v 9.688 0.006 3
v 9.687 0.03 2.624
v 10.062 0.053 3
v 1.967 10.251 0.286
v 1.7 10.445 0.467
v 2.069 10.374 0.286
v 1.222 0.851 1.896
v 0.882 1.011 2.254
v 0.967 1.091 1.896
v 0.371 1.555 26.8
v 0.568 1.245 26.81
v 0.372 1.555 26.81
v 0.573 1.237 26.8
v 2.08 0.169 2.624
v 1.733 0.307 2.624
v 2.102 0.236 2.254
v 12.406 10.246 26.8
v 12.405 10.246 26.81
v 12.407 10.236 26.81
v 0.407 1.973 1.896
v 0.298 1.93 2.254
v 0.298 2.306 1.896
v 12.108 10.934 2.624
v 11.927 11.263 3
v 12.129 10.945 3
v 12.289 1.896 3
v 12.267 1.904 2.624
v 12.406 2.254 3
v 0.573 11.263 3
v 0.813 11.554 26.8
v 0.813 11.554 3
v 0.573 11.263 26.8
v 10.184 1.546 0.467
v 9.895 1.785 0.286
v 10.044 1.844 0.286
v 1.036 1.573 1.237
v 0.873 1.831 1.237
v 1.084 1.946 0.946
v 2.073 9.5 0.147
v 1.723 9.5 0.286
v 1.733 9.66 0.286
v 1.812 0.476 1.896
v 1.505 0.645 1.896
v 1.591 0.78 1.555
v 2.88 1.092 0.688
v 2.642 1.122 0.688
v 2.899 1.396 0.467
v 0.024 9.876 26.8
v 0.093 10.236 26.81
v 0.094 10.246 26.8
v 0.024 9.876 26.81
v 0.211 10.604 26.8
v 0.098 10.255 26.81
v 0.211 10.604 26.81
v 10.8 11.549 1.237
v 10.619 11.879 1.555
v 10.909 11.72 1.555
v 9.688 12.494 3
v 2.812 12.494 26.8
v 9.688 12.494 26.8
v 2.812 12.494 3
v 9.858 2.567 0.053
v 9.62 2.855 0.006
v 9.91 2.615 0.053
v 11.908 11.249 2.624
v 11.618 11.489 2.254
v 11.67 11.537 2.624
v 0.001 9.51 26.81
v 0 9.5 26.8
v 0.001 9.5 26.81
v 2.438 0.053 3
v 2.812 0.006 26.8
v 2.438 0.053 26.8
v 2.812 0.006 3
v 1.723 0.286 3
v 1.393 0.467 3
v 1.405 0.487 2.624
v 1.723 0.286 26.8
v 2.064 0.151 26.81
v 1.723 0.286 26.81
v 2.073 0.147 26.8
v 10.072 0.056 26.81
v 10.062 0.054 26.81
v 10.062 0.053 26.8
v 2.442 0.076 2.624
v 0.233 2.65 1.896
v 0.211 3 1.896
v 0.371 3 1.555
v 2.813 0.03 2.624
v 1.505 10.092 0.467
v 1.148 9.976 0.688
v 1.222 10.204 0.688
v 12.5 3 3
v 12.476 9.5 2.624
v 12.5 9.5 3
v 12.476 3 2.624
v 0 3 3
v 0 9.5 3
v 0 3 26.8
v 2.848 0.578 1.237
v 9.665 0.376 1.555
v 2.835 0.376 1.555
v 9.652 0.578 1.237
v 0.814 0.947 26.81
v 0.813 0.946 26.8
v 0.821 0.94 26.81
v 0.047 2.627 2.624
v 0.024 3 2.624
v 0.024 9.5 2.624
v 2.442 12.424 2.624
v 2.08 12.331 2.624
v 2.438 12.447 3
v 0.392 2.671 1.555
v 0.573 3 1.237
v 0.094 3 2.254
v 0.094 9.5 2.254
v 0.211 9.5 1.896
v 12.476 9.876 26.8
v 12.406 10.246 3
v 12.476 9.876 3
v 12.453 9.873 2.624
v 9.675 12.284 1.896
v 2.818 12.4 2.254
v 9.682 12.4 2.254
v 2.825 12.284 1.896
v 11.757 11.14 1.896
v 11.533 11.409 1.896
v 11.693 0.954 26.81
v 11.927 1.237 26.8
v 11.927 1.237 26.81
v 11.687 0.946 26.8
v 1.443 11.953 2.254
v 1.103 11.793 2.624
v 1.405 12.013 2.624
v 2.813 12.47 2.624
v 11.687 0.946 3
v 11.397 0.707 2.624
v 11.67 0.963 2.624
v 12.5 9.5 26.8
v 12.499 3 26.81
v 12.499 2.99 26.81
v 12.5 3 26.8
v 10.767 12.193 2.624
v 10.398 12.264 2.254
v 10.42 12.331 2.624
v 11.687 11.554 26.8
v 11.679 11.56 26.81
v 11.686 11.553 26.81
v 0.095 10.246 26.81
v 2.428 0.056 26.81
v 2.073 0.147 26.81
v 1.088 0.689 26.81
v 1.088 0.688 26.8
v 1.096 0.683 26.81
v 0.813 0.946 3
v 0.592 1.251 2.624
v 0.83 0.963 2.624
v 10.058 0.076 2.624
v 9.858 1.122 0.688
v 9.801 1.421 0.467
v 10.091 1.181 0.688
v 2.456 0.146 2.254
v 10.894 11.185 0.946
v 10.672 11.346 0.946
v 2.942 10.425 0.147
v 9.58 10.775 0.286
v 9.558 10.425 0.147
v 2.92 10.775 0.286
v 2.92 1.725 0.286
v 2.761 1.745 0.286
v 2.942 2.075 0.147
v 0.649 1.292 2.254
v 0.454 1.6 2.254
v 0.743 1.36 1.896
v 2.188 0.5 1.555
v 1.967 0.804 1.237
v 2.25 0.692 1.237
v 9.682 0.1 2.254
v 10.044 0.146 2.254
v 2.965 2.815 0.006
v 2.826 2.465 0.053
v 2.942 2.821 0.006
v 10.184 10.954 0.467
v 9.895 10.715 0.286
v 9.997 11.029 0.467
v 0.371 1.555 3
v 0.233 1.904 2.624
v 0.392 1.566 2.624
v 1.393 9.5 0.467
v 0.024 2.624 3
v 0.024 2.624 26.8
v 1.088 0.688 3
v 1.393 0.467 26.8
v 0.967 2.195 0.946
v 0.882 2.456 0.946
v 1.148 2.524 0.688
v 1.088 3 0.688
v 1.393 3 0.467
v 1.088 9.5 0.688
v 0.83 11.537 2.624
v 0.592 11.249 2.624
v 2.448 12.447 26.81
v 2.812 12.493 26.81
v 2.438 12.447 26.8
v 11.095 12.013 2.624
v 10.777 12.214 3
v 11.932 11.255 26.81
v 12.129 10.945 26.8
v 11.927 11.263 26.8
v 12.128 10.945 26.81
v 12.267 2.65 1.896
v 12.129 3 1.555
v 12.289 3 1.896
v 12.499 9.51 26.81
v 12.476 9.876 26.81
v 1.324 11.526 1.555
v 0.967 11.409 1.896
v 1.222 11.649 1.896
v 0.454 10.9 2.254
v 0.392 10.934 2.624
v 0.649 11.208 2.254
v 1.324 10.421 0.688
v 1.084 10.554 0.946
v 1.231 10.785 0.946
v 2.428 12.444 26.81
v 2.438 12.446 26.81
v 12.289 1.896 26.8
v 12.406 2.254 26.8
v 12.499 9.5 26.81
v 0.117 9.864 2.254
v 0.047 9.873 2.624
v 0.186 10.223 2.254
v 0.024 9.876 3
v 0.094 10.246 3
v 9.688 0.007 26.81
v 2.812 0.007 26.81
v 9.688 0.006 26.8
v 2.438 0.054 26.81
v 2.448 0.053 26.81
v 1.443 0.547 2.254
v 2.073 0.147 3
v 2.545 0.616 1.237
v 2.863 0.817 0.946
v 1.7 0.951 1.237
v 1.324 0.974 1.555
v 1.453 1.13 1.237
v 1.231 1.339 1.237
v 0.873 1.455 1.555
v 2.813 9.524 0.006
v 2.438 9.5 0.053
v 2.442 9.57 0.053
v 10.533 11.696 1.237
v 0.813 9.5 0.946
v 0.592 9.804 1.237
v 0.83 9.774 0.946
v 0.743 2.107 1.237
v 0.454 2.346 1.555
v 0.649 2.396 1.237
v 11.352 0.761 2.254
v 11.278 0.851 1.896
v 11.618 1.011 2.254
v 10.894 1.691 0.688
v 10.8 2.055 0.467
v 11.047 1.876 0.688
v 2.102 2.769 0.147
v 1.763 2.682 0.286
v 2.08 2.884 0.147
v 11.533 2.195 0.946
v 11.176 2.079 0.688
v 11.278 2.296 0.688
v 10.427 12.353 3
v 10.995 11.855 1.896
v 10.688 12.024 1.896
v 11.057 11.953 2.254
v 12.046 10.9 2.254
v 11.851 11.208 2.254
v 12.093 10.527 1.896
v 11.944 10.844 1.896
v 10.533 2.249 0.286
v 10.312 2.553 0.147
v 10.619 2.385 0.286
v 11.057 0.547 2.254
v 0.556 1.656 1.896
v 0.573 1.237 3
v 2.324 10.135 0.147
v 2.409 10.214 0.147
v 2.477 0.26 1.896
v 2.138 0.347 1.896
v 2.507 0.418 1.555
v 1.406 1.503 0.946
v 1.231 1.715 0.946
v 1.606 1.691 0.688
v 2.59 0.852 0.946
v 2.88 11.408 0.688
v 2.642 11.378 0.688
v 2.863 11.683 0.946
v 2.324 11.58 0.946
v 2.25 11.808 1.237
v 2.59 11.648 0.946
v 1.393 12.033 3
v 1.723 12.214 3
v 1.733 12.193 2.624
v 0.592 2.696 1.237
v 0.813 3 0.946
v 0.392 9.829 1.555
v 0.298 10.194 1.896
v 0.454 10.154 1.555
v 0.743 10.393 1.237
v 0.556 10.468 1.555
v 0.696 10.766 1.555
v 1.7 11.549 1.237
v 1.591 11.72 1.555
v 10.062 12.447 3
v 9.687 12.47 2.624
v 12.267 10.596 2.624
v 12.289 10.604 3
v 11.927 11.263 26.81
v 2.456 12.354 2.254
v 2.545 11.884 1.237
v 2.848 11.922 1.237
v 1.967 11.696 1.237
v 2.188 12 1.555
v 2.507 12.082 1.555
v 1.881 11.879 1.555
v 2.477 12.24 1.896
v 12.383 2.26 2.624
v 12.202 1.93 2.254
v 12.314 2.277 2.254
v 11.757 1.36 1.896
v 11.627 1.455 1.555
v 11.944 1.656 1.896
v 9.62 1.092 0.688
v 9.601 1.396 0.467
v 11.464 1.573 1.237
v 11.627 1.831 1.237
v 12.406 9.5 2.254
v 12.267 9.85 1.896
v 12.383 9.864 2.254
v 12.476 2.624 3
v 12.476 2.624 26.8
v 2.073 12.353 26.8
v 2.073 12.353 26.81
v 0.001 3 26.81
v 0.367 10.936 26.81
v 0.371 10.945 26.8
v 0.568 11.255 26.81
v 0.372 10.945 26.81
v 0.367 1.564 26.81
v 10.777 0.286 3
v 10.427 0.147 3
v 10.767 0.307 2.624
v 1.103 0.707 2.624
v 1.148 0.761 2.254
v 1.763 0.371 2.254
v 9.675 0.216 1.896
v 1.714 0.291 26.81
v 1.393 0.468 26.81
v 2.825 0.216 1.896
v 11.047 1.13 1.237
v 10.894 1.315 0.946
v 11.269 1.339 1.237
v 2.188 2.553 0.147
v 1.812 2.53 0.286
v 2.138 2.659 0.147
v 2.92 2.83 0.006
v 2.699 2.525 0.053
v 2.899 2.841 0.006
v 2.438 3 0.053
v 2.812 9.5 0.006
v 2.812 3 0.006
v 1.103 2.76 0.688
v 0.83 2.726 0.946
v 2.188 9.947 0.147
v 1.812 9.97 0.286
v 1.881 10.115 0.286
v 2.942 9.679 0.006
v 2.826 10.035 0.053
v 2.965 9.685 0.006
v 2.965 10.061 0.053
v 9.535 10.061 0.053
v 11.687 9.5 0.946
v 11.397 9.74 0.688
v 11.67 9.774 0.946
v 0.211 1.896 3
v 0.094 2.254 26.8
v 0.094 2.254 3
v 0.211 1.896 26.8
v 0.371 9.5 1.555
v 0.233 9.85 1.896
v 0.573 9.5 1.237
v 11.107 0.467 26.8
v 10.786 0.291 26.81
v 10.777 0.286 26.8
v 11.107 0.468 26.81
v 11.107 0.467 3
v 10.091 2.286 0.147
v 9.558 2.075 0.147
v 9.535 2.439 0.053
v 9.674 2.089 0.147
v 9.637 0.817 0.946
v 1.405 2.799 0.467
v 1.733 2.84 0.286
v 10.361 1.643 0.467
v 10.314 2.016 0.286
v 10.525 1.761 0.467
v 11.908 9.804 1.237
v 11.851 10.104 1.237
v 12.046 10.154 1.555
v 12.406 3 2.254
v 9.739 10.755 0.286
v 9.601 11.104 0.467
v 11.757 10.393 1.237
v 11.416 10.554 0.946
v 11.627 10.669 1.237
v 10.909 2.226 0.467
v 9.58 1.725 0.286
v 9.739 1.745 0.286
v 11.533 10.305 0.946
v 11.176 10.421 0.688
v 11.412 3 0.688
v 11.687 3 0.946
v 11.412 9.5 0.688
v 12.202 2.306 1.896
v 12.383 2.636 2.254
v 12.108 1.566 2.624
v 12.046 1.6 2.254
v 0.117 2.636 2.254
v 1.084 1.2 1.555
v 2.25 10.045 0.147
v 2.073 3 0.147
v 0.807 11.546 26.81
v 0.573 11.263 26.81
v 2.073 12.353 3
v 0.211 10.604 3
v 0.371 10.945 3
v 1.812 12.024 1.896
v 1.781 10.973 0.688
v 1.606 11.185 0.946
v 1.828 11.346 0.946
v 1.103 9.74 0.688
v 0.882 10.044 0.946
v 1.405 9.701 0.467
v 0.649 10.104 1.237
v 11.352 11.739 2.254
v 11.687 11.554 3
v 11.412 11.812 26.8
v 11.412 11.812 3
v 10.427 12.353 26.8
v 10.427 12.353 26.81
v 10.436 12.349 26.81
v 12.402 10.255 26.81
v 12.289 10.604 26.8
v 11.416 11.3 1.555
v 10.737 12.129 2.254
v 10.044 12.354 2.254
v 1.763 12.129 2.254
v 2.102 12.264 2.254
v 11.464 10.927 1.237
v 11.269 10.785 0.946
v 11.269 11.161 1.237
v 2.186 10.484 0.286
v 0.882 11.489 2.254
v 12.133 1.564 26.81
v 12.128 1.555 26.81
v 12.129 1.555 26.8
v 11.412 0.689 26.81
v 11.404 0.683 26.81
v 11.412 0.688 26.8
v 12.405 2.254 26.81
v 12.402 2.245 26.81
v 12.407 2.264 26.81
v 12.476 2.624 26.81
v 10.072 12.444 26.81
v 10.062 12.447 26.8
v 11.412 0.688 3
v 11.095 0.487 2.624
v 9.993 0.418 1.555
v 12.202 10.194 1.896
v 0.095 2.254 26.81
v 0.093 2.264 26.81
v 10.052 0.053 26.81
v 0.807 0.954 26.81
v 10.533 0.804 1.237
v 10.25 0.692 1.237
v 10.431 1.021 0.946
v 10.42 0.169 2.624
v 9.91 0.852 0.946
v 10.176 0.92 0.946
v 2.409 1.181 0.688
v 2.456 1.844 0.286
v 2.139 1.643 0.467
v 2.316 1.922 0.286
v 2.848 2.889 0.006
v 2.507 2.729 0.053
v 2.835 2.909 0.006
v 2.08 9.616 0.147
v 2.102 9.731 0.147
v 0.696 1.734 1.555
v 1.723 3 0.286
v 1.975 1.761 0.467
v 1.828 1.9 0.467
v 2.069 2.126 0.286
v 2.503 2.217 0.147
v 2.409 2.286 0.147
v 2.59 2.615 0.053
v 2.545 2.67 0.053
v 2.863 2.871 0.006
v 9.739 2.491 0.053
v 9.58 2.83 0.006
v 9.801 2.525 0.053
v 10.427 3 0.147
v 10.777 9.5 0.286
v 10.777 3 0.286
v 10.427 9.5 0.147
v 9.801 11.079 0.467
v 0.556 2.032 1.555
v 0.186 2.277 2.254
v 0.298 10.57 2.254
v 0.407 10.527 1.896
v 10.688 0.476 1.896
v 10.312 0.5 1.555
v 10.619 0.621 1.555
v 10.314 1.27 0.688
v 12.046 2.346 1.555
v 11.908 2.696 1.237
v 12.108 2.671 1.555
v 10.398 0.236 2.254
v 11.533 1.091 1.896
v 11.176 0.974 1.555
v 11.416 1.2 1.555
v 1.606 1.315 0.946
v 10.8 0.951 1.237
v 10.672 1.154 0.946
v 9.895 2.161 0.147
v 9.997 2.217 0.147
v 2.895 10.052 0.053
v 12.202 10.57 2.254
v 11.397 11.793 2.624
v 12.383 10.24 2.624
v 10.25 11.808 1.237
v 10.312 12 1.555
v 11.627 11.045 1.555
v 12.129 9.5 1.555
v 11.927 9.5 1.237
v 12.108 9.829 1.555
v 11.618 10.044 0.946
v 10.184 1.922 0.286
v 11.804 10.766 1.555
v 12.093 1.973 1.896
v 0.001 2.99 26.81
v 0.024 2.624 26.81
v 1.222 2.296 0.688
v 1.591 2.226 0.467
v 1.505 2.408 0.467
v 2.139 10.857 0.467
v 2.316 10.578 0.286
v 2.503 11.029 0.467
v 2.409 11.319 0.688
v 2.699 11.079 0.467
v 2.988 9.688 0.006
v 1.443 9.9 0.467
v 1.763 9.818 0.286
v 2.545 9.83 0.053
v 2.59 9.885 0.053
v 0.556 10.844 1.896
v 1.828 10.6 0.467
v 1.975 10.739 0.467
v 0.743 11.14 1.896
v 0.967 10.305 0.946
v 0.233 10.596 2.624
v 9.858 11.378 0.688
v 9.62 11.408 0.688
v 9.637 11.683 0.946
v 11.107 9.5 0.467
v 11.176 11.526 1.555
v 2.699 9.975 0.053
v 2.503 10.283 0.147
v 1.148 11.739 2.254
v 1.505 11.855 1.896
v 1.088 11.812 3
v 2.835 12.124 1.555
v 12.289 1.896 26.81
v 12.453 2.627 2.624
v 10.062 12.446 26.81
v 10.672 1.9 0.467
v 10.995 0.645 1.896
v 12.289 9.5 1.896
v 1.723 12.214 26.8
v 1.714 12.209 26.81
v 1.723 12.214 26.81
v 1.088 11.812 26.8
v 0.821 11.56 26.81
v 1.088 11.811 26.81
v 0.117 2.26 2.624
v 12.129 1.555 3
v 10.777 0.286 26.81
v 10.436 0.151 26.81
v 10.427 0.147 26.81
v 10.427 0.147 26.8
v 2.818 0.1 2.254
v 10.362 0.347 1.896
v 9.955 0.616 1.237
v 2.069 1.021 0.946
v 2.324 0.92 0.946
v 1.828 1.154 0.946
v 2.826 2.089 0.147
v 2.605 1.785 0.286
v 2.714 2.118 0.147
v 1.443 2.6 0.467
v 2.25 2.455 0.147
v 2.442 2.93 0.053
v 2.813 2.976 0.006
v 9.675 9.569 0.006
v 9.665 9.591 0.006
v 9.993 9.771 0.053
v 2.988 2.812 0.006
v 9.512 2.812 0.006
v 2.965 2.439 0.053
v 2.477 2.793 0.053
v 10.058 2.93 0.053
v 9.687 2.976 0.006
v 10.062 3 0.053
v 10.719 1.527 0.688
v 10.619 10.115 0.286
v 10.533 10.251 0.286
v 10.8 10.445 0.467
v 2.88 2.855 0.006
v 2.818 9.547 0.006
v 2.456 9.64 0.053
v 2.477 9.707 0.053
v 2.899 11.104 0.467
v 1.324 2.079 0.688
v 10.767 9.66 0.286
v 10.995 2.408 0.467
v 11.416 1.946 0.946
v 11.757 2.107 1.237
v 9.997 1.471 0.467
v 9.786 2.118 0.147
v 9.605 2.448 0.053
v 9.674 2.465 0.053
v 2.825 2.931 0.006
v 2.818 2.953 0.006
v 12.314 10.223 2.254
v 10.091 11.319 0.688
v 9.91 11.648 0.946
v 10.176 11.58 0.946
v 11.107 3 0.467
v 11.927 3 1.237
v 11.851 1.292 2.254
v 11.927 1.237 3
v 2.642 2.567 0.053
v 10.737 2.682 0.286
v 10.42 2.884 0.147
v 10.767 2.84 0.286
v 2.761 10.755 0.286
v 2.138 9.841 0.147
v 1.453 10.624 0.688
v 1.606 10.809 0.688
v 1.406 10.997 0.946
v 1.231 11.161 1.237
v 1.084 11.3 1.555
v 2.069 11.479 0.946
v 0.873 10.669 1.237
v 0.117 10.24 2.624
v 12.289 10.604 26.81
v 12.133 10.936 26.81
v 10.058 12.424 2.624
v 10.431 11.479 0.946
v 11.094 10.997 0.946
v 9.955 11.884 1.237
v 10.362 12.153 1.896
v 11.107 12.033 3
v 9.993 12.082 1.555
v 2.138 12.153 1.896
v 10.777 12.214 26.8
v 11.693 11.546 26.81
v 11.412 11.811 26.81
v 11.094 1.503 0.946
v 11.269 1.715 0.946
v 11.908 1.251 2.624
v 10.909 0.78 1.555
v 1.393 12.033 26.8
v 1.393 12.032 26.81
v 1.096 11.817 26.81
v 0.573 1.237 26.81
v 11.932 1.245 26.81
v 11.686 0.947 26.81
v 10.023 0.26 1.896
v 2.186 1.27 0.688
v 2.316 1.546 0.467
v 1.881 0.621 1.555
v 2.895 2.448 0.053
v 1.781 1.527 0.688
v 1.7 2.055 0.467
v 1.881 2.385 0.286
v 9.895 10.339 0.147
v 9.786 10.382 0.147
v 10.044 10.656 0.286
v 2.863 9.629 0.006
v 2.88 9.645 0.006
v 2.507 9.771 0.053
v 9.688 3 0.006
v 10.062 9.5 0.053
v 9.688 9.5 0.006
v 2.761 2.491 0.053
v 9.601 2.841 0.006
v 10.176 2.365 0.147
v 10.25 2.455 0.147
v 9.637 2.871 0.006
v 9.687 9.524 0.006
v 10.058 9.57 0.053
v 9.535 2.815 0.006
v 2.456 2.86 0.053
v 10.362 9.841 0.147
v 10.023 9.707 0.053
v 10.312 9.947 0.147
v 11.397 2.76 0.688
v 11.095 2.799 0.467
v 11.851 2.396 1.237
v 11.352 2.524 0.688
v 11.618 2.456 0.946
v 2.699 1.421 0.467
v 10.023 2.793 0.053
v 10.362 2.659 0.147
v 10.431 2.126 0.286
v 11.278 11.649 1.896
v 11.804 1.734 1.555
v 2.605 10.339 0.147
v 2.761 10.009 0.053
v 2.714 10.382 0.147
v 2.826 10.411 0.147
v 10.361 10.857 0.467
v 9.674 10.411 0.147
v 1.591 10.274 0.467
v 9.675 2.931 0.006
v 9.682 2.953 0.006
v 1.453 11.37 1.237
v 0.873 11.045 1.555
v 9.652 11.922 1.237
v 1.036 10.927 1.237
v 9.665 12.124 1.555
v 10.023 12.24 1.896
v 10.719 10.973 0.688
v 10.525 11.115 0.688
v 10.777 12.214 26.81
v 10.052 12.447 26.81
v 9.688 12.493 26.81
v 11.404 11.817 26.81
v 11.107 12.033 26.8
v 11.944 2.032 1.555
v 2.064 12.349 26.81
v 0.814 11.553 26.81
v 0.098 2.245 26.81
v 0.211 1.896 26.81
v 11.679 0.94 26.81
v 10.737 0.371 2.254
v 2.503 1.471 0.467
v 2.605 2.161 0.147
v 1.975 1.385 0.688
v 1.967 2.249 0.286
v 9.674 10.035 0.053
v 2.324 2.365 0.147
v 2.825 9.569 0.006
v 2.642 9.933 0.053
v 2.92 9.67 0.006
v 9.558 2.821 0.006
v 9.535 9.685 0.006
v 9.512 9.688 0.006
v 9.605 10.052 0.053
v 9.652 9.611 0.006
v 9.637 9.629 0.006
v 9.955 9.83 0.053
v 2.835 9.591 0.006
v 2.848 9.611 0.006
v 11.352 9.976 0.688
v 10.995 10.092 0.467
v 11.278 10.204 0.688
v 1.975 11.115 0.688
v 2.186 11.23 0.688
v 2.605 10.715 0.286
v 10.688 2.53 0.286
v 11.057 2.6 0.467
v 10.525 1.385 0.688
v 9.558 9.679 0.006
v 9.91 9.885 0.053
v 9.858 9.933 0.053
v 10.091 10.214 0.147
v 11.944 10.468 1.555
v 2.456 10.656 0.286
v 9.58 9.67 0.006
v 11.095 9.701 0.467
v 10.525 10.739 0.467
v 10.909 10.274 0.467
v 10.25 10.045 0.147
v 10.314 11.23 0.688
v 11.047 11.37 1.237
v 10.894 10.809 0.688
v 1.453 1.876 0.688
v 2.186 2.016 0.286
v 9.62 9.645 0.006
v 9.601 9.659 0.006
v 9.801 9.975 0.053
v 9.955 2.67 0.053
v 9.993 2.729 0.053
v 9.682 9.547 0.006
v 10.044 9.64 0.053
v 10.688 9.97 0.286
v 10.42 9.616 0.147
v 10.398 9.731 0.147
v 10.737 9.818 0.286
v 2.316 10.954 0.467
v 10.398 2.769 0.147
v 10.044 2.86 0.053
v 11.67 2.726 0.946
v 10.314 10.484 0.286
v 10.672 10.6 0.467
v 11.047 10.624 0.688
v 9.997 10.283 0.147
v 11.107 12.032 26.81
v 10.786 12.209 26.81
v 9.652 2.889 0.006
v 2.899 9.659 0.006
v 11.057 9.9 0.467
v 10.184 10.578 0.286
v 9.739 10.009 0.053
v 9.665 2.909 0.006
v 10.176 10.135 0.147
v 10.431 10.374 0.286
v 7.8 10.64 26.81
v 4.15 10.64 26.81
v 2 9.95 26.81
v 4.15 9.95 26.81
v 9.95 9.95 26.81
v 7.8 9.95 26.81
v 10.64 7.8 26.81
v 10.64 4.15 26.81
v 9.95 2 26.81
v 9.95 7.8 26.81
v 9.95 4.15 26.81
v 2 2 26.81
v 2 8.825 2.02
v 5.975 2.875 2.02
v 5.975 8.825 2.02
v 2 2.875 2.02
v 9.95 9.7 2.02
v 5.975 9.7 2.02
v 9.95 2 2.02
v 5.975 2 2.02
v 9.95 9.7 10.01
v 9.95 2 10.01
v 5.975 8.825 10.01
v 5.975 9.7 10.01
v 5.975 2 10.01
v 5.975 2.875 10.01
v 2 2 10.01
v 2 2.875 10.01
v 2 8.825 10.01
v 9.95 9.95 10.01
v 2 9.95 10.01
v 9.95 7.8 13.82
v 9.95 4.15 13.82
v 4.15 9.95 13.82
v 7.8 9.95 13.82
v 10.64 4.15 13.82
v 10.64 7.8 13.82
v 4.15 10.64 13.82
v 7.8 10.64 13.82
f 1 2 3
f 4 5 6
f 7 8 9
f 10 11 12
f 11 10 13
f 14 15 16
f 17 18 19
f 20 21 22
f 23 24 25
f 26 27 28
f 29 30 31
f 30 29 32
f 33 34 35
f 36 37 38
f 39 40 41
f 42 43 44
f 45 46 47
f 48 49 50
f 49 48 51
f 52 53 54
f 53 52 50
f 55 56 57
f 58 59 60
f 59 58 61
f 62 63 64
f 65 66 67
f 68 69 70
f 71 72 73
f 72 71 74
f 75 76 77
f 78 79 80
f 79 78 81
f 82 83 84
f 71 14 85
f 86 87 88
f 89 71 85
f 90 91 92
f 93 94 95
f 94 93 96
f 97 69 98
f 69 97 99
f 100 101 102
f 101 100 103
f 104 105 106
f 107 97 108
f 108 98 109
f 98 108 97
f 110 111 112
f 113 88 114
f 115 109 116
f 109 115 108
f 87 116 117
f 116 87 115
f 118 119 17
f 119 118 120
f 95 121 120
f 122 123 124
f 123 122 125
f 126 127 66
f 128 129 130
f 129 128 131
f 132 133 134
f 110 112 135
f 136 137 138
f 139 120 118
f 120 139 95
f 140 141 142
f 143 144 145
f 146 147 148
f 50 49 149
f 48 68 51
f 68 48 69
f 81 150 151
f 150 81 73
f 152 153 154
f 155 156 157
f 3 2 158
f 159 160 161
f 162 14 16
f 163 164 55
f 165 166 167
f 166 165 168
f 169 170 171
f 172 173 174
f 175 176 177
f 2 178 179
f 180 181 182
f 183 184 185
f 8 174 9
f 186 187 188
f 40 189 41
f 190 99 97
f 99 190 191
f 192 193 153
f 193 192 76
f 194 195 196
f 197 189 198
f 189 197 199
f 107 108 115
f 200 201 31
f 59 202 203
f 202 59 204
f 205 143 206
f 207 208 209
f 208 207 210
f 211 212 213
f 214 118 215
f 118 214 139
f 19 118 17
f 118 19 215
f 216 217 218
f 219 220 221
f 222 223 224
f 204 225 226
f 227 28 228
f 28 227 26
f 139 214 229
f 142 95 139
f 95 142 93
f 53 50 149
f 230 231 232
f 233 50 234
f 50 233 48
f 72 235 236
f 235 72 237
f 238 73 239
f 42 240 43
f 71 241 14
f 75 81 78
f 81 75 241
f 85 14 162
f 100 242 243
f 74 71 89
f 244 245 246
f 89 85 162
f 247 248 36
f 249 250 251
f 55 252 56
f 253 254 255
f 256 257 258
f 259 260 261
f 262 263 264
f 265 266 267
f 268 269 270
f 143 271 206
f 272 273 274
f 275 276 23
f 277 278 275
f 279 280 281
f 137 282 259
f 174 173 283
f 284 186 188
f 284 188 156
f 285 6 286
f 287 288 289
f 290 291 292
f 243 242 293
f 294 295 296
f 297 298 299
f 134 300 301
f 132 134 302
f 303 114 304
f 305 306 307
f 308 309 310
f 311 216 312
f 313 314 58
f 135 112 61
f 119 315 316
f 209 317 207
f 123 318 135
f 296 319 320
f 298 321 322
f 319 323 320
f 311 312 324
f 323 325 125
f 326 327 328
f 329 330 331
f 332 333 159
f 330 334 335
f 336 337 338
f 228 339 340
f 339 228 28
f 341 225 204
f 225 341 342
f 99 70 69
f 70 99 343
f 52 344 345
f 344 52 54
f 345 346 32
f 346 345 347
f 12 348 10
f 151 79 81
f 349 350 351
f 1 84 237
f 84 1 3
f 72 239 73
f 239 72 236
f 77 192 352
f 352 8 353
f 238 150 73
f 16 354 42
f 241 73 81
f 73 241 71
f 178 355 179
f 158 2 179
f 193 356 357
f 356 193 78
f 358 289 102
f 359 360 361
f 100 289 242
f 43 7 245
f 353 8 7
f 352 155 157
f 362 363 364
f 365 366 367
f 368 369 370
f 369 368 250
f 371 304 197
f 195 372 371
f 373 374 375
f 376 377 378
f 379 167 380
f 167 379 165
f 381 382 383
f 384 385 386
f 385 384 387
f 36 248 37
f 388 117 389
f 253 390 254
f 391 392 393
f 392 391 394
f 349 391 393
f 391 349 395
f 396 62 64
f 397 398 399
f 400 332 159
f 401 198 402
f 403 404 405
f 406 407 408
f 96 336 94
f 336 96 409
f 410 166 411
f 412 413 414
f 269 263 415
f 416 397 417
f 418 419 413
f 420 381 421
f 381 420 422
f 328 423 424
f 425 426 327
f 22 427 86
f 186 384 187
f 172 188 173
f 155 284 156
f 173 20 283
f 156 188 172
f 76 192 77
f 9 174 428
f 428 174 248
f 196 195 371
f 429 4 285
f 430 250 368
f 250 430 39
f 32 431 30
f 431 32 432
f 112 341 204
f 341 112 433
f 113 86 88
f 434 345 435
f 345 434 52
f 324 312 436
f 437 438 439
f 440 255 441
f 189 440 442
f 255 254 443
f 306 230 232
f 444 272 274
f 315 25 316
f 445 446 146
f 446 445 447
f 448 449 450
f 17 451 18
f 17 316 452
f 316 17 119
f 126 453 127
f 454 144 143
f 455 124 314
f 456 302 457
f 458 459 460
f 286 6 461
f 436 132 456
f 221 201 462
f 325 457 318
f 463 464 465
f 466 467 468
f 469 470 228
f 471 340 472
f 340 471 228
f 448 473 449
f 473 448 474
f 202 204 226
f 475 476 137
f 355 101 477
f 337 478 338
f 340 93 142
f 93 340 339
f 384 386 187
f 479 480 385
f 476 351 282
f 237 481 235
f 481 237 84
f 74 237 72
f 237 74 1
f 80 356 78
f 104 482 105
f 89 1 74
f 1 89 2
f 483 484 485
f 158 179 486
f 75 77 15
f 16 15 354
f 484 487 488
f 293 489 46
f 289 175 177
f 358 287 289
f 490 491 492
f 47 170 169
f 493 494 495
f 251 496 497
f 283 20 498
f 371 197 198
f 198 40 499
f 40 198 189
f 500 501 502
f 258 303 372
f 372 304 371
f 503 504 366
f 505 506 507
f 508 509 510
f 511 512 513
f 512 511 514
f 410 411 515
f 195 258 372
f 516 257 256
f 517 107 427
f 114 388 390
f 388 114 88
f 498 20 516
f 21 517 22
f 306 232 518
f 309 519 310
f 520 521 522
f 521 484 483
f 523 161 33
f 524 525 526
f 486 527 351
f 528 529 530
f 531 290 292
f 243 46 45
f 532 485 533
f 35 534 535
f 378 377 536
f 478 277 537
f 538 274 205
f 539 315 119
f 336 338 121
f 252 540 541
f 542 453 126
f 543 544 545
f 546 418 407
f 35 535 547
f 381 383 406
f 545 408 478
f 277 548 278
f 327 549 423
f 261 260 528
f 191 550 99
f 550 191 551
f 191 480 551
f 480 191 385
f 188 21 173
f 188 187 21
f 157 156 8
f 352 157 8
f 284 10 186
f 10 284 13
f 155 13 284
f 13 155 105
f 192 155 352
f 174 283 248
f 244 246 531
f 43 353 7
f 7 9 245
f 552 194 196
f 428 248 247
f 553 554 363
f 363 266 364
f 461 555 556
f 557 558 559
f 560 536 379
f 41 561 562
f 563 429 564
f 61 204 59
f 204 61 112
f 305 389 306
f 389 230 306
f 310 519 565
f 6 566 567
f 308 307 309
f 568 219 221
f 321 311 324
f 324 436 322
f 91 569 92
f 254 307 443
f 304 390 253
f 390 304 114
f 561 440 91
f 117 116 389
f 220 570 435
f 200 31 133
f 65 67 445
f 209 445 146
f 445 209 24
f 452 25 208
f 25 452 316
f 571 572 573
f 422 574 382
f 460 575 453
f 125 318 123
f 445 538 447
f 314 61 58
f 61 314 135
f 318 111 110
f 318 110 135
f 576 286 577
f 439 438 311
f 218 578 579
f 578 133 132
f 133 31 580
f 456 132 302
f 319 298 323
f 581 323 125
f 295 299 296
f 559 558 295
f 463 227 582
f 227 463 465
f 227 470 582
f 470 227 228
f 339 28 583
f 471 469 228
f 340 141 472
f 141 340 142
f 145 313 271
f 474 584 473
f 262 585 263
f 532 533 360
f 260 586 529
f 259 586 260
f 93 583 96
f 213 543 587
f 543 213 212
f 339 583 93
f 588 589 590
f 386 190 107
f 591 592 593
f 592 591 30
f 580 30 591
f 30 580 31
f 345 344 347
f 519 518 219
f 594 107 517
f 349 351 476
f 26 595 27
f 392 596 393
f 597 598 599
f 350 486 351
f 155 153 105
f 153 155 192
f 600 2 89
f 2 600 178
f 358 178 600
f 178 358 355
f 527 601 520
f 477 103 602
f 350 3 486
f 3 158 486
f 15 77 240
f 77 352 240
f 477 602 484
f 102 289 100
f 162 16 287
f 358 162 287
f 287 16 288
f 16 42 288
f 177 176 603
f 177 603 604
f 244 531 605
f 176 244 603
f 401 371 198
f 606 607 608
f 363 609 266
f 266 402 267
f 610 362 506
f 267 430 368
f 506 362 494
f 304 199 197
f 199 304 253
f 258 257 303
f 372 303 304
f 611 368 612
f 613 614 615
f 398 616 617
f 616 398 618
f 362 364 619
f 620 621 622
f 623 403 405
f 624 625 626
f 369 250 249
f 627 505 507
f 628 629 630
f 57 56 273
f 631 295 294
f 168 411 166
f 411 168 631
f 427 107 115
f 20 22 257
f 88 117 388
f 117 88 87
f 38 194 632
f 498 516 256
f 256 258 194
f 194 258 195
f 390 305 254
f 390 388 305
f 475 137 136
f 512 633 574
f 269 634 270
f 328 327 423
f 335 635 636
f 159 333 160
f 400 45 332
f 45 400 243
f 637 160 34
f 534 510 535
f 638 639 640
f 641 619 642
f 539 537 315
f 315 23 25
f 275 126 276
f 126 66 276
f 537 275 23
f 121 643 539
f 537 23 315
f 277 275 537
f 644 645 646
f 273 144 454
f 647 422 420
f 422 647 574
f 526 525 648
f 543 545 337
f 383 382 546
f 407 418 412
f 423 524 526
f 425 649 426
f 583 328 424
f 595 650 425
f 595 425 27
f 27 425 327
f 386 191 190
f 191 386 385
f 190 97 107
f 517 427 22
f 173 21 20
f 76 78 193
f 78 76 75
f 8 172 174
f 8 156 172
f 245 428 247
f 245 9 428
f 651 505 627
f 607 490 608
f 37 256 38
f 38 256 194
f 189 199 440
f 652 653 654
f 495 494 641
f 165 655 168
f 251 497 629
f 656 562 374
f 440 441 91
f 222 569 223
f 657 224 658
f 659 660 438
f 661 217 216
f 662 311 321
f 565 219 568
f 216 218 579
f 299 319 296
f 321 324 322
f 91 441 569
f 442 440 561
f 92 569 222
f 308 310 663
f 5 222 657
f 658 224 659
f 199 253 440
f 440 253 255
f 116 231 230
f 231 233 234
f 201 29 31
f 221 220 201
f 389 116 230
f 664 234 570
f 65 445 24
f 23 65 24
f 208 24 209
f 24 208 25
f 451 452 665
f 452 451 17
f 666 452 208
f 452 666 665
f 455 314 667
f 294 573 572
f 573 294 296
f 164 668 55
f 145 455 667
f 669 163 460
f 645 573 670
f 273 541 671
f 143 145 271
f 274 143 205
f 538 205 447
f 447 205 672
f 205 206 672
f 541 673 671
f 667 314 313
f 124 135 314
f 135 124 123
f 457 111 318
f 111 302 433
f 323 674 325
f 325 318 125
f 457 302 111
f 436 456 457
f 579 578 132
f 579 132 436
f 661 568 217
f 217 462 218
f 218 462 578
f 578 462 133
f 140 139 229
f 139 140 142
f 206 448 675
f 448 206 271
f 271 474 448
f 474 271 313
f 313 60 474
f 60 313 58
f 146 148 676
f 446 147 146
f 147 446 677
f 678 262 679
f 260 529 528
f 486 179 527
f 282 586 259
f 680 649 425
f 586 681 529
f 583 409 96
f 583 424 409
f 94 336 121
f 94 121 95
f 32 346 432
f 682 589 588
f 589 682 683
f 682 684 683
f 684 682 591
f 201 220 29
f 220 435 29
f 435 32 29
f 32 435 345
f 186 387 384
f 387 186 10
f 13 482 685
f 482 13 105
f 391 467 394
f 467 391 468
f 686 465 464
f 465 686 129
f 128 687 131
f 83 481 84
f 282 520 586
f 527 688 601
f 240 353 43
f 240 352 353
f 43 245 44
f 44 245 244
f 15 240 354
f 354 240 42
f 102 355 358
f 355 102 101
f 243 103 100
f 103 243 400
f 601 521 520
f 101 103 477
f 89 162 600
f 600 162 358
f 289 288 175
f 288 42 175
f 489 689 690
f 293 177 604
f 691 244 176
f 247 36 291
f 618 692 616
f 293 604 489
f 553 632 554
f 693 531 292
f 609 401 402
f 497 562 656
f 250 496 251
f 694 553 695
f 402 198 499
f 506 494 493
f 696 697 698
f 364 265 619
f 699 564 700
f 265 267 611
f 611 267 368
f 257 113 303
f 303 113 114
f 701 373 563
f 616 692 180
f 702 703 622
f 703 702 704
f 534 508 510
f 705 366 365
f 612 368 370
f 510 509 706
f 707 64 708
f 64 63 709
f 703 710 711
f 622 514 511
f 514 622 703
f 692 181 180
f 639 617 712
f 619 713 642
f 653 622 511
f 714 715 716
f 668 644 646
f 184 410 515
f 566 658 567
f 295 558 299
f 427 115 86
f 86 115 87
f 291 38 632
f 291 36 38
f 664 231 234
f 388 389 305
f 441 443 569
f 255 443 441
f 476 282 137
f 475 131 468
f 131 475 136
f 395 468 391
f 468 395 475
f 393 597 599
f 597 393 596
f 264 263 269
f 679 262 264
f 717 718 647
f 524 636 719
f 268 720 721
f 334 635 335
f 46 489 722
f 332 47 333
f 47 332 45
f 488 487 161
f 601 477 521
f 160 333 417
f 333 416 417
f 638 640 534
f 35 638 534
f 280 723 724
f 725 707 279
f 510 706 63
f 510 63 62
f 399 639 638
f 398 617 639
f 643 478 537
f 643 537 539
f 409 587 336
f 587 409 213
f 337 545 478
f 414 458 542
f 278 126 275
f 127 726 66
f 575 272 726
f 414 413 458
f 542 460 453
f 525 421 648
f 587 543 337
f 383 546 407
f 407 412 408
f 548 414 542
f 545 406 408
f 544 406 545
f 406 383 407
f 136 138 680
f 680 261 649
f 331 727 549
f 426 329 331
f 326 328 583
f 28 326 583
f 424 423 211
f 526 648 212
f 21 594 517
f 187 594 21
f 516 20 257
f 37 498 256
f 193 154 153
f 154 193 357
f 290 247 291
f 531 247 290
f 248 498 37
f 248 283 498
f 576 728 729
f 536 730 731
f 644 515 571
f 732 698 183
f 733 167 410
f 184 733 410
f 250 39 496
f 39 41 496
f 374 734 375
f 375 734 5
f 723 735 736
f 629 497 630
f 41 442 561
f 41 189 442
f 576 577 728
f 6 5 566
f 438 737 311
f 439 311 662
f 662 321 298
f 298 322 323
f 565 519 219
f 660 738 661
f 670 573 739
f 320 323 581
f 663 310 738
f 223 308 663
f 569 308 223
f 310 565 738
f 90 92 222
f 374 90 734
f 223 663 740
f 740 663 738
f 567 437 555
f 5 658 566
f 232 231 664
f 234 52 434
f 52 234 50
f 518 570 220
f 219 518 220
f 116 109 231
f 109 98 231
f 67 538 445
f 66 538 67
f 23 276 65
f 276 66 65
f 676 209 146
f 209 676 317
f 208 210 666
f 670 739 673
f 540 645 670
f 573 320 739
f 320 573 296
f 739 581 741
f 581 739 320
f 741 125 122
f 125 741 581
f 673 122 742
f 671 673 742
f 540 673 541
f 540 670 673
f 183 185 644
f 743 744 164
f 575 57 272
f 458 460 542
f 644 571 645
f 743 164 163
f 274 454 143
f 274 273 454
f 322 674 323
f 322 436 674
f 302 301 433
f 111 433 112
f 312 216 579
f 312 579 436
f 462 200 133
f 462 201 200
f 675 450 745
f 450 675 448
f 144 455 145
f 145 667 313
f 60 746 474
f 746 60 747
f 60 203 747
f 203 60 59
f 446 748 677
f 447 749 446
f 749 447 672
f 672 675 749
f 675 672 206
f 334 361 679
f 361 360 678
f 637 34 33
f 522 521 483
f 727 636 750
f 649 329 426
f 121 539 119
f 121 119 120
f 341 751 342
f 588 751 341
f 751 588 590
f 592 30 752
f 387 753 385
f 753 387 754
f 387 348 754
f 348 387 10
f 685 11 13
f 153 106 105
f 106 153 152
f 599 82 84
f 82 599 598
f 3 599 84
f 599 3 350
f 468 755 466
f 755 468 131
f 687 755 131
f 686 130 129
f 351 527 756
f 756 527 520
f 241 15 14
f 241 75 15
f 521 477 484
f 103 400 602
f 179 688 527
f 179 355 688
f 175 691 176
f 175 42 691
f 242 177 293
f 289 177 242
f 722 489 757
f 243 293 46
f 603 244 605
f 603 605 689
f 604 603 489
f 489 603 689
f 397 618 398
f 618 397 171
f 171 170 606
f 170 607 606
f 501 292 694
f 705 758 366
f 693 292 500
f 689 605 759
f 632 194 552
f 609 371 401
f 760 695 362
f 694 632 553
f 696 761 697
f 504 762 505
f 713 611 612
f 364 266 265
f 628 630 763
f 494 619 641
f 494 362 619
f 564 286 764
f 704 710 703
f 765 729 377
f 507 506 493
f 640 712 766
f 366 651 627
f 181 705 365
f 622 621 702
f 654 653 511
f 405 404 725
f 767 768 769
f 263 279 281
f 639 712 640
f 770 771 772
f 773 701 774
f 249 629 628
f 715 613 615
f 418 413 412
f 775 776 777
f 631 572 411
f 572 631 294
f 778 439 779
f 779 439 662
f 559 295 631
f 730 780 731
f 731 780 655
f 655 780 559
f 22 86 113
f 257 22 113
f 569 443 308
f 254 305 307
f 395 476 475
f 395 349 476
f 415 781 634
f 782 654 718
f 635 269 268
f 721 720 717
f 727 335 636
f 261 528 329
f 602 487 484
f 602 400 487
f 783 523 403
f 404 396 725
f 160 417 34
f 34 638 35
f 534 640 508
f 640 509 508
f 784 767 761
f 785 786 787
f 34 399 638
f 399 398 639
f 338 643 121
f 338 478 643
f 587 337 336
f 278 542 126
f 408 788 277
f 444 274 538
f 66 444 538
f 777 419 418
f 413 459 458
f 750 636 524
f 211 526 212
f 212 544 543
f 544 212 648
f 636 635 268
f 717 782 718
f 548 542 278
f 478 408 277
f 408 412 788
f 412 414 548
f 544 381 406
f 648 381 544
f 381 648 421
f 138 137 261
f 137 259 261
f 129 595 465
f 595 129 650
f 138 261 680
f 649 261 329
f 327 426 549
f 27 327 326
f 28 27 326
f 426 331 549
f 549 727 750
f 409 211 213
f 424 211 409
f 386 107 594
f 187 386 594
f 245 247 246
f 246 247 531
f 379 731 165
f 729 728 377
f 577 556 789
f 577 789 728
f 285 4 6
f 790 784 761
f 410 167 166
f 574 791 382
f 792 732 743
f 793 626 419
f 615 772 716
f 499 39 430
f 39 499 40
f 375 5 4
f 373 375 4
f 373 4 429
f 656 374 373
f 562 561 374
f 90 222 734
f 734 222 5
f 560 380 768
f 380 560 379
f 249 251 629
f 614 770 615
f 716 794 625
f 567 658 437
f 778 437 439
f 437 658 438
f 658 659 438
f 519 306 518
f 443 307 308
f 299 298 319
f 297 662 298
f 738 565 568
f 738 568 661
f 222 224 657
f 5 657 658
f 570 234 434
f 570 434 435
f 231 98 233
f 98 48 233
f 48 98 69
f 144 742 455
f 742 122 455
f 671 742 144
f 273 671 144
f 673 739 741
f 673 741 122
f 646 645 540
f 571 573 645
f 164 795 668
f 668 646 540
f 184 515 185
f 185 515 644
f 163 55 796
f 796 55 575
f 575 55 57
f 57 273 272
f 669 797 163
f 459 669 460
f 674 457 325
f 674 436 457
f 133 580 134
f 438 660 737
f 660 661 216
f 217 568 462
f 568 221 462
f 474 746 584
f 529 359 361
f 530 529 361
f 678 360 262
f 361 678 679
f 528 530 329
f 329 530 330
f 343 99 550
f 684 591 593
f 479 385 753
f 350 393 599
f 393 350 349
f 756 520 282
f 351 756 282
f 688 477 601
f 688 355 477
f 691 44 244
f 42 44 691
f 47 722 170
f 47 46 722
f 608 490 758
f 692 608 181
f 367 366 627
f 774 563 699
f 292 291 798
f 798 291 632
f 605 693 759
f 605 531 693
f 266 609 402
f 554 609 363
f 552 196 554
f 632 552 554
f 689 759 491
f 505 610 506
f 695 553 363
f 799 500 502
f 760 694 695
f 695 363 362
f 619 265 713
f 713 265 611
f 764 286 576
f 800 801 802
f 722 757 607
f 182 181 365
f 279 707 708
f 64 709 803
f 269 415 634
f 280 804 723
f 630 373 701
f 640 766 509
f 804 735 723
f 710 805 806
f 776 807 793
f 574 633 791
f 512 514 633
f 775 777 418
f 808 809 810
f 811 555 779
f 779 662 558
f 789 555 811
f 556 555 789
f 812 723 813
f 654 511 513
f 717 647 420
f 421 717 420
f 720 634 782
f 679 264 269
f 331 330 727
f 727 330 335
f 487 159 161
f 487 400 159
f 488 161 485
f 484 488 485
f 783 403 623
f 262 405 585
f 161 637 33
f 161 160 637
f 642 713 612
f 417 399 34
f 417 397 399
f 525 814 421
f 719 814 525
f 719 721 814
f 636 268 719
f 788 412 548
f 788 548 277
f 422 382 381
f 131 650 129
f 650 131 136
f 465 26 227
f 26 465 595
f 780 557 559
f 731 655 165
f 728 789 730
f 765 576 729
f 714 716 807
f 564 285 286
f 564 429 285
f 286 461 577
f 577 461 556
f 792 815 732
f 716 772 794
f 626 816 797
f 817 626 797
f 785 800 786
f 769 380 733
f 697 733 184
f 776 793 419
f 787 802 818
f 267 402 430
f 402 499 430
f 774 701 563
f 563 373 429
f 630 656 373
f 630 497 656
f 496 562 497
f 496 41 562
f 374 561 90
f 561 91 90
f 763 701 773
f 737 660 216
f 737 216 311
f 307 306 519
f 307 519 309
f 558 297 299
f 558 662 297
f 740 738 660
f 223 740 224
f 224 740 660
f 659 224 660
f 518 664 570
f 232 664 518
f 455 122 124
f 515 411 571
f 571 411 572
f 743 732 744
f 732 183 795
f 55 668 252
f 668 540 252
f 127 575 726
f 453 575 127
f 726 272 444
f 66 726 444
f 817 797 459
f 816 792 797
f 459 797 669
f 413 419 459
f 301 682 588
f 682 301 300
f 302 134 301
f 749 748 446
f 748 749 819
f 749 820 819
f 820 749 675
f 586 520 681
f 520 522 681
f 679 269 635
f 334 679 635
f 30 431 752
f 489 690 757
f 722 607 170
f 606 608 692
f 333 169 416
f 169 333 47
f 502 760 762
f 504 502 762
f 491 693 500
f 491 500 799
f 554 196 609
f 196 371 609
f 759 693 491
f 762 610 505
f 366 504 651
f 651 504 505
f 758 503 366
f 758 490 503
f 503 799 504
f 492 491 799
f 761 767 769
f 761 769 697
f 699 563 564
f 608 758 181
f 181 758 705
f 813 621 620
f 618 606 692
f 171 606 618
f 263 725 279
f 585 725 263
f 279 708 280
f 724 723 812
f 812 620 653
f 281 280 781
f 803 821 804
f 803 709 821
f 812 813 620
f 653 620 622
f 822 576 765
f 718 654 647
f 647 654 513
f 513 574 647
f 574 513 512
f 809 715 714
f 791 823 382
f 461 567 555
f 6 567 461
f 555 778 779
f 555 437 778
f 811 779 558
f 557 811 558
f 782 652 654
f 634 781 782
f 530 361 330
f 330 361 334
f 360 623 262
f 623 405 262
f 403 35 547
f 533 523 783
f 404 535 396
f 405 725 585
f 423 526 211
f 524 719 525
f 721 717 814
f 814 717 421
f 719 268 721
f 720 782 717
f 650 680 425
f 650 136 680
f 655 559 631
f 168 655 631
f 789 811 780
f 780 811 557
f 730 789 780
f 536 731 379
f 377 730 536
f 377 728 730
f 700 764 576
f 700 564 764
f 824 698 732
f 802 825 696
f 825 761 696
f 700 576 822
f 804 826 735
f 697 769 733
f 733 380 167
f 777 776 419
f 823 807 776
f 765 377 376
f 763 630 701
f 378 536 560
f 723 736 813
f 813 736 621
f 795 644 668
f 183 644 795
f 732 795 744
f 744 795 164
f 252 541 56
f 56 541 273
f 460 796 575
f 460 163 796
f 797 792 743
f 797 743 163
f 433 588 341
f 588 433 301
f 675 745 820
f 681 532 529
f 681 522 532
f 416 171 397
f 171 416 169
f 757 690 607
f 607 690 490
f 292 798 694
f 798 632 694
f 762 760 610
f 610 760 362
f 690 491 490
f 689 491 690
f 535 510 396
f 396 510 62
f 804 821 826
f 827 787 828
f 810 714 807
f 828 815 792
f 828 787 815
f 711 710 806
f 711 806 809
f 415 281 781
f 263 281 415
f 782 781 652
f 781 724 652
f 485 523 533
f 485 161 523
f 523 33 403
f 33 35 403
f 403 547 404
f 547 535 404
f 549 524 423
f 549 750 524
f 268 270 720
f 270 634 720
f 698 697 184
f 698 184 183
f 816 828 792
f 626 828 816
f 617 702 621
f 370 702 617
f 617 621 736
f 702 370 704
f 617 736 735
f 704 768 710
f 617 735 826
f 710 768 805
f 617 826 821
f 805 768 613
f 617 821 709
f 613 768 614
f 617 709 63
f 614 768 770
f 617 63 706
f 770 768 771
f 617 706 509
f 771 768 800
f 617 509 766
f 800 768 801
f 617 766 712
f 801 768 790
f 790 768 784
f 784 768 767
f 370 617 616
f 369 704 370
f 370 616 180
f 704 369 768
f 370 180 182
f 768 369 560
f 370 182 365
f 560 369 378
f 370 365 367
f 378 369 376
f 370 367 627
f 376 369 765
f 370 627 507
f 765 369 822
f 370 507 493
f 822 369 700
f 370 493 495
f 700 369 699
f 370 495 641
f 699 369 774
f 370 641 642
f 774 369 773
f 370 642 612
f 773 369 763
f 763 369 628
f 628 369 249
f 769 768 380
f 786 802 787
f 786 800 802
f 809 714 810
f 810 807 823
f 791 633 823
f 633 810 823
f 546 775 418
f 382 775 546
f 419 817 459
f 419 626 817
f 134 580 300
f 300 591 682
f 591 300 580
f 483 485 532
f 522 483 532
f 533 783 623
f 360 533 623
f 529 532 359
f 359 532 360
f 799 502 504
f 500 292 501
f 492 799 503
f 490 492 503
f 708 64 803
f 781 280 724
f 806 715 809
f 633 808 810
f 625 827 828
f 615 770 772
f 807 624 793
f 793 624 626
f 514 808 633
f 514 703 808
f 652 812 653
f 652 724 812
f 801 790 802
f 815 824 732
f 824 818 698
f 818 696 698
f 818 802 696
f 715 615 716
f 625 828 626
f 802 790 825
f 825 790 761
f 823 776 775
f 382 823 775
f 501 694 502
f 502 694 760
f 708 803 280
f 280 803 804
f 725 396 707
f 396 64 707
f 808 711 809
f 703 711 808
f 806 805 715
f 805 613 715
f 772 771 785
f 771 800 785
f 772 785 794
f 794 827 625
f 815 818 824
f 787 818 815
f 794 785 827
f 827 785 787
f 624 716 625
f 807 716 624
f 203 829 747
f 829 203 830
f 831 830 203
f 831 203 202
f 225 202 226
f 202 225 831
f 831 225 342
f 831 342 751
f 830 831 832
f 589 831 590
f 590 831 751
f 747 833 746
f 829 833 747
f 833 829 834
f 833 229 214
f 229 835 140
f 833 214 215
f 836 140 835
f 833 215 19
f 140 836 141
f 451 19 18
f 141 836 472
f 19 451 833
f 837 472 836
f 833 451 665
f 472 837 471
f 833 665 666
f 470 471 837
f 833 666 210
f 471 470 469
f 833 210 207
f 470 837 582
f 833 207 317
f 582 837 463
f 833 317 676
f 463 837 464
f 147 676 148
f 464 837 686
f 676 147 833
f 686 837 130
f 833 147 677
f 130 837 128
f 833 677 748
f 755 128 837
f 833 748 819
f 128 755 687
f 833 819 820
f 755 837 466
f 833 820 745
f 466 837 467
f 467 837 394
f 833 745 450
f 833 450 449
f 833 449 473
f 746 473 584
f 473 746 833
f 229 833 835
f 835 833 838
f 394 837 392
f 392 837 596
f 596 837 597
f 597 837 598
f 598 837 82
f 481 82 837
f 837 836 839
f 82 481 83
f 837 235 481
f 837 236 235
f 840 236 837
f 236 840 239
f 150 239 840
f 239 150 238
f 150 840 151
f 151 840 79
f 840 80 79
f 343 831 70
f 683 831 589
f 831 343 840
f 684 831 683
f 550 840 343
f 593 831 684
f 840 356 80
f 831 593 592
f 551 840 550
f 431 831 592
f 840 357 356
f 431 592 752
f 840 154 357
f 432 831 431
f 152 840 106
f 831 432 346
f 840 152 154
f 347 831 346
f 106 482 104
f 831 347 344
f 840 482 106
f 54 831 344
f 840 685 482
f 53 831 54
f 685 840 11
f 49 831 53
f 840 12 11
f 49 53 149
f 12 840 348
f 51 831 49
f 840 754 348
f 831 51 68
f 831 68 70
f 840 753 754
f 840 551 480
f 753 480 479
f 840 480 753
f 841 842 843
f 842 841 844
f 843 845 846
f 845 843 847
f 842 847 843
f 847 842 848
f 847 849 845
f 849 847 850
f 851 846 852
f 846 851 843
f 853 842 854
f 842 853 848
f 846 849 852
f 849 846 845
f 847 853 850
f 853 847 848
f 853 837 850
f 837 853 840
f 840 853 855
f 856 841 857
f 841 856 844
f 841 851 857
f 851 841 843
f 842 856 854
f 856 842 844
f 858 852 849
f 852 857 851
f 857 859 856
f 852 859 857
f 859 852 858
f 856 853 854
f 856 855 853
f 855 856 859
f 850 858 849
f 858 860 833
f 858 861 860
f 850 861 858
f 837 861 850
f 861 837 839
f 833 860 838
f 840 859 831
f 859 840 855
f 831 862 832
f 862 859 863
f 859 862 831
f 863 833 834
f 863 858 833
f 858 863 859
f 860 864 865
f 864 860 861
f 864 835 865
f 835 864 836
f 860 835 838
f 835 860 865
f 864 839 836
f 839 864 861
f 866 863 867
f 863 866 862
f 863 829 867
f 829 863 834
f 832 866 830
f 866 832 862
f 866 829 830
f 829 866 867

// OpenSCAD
include <../libs/pw_primitives.scad>;

tolerance = 0.15;
connector_upper_wid = 7.55;  conn_upp_wid_t = connector_upper_wid + tolerance;
connector_lower_wid = 5.8;  conn_low_wid_t = connector_lower_wid + tolerance;
conn_low_offset = (connector_upper_wid - connector_lower_wid)/2;
// The connector body is essentially square, so height is used as width as well.
connector_full_hgt = 7.8;  conn_hgt_t = connector_full_hgt + tolerance;
conn_half_t = conn_hgt_t / 2;
powerpole_wid = 8.5;  // this is offset on the top and left sides looking down;
connector_len = 8;  lug_len = 13;  lug_width = 3.35;  powerpole_len = 24.8;
lug_offset = powerpole_wid - connector_full_hgt;  lug_w_t = lug_width + tolerance*2;
lug_body_len = powerpole_len - connector_len;

grip_thick = 2;
body_len = powerpole_wid + grip_thick*2;  body_hgt = powerpole_len + grip_thick;
chamfer_r = 3;

$fn = ($preview ? 20 : 50);
module anderson_powerpole() union() {
    // main body
    cube([lug_body_len+epsilon, conn_hgt_t, conn_hgt_t]);
    // the two connector pieces
    translate([lug_body_len, 0, conn_half_t]) union() {
        translate([0, 0, 0]) cube([connector_len, conn_upp_wid_t, conn_half_t]);
        translate([0, conn_low_offset, -conn_half_t])
          cube([connector_len, conn_low_wid_t, conn_half_t+epsilon]);
    }
    // the lug at the top
    translate([0, conn_half_t-lug_w_t/2, conn_hgt_t-epsilon])
      cube([lug_len, lug_w_t, lug_offset]);
    // the lug on the left hand side
    translate([0, conn_hgt_t-epsilon, conn_half_t-lug_w_t/2])
      cube([lug_len, lug_offset, lug_w_t]);
}

difference() {
    rounded_box(body_len, body_len, body_hgt, chamfer_r);
    translate([grip_thick, grip_thick, body_hgt+epsilo2]) rotate([0, 90, 0])
      anderson_powerpole();
}
